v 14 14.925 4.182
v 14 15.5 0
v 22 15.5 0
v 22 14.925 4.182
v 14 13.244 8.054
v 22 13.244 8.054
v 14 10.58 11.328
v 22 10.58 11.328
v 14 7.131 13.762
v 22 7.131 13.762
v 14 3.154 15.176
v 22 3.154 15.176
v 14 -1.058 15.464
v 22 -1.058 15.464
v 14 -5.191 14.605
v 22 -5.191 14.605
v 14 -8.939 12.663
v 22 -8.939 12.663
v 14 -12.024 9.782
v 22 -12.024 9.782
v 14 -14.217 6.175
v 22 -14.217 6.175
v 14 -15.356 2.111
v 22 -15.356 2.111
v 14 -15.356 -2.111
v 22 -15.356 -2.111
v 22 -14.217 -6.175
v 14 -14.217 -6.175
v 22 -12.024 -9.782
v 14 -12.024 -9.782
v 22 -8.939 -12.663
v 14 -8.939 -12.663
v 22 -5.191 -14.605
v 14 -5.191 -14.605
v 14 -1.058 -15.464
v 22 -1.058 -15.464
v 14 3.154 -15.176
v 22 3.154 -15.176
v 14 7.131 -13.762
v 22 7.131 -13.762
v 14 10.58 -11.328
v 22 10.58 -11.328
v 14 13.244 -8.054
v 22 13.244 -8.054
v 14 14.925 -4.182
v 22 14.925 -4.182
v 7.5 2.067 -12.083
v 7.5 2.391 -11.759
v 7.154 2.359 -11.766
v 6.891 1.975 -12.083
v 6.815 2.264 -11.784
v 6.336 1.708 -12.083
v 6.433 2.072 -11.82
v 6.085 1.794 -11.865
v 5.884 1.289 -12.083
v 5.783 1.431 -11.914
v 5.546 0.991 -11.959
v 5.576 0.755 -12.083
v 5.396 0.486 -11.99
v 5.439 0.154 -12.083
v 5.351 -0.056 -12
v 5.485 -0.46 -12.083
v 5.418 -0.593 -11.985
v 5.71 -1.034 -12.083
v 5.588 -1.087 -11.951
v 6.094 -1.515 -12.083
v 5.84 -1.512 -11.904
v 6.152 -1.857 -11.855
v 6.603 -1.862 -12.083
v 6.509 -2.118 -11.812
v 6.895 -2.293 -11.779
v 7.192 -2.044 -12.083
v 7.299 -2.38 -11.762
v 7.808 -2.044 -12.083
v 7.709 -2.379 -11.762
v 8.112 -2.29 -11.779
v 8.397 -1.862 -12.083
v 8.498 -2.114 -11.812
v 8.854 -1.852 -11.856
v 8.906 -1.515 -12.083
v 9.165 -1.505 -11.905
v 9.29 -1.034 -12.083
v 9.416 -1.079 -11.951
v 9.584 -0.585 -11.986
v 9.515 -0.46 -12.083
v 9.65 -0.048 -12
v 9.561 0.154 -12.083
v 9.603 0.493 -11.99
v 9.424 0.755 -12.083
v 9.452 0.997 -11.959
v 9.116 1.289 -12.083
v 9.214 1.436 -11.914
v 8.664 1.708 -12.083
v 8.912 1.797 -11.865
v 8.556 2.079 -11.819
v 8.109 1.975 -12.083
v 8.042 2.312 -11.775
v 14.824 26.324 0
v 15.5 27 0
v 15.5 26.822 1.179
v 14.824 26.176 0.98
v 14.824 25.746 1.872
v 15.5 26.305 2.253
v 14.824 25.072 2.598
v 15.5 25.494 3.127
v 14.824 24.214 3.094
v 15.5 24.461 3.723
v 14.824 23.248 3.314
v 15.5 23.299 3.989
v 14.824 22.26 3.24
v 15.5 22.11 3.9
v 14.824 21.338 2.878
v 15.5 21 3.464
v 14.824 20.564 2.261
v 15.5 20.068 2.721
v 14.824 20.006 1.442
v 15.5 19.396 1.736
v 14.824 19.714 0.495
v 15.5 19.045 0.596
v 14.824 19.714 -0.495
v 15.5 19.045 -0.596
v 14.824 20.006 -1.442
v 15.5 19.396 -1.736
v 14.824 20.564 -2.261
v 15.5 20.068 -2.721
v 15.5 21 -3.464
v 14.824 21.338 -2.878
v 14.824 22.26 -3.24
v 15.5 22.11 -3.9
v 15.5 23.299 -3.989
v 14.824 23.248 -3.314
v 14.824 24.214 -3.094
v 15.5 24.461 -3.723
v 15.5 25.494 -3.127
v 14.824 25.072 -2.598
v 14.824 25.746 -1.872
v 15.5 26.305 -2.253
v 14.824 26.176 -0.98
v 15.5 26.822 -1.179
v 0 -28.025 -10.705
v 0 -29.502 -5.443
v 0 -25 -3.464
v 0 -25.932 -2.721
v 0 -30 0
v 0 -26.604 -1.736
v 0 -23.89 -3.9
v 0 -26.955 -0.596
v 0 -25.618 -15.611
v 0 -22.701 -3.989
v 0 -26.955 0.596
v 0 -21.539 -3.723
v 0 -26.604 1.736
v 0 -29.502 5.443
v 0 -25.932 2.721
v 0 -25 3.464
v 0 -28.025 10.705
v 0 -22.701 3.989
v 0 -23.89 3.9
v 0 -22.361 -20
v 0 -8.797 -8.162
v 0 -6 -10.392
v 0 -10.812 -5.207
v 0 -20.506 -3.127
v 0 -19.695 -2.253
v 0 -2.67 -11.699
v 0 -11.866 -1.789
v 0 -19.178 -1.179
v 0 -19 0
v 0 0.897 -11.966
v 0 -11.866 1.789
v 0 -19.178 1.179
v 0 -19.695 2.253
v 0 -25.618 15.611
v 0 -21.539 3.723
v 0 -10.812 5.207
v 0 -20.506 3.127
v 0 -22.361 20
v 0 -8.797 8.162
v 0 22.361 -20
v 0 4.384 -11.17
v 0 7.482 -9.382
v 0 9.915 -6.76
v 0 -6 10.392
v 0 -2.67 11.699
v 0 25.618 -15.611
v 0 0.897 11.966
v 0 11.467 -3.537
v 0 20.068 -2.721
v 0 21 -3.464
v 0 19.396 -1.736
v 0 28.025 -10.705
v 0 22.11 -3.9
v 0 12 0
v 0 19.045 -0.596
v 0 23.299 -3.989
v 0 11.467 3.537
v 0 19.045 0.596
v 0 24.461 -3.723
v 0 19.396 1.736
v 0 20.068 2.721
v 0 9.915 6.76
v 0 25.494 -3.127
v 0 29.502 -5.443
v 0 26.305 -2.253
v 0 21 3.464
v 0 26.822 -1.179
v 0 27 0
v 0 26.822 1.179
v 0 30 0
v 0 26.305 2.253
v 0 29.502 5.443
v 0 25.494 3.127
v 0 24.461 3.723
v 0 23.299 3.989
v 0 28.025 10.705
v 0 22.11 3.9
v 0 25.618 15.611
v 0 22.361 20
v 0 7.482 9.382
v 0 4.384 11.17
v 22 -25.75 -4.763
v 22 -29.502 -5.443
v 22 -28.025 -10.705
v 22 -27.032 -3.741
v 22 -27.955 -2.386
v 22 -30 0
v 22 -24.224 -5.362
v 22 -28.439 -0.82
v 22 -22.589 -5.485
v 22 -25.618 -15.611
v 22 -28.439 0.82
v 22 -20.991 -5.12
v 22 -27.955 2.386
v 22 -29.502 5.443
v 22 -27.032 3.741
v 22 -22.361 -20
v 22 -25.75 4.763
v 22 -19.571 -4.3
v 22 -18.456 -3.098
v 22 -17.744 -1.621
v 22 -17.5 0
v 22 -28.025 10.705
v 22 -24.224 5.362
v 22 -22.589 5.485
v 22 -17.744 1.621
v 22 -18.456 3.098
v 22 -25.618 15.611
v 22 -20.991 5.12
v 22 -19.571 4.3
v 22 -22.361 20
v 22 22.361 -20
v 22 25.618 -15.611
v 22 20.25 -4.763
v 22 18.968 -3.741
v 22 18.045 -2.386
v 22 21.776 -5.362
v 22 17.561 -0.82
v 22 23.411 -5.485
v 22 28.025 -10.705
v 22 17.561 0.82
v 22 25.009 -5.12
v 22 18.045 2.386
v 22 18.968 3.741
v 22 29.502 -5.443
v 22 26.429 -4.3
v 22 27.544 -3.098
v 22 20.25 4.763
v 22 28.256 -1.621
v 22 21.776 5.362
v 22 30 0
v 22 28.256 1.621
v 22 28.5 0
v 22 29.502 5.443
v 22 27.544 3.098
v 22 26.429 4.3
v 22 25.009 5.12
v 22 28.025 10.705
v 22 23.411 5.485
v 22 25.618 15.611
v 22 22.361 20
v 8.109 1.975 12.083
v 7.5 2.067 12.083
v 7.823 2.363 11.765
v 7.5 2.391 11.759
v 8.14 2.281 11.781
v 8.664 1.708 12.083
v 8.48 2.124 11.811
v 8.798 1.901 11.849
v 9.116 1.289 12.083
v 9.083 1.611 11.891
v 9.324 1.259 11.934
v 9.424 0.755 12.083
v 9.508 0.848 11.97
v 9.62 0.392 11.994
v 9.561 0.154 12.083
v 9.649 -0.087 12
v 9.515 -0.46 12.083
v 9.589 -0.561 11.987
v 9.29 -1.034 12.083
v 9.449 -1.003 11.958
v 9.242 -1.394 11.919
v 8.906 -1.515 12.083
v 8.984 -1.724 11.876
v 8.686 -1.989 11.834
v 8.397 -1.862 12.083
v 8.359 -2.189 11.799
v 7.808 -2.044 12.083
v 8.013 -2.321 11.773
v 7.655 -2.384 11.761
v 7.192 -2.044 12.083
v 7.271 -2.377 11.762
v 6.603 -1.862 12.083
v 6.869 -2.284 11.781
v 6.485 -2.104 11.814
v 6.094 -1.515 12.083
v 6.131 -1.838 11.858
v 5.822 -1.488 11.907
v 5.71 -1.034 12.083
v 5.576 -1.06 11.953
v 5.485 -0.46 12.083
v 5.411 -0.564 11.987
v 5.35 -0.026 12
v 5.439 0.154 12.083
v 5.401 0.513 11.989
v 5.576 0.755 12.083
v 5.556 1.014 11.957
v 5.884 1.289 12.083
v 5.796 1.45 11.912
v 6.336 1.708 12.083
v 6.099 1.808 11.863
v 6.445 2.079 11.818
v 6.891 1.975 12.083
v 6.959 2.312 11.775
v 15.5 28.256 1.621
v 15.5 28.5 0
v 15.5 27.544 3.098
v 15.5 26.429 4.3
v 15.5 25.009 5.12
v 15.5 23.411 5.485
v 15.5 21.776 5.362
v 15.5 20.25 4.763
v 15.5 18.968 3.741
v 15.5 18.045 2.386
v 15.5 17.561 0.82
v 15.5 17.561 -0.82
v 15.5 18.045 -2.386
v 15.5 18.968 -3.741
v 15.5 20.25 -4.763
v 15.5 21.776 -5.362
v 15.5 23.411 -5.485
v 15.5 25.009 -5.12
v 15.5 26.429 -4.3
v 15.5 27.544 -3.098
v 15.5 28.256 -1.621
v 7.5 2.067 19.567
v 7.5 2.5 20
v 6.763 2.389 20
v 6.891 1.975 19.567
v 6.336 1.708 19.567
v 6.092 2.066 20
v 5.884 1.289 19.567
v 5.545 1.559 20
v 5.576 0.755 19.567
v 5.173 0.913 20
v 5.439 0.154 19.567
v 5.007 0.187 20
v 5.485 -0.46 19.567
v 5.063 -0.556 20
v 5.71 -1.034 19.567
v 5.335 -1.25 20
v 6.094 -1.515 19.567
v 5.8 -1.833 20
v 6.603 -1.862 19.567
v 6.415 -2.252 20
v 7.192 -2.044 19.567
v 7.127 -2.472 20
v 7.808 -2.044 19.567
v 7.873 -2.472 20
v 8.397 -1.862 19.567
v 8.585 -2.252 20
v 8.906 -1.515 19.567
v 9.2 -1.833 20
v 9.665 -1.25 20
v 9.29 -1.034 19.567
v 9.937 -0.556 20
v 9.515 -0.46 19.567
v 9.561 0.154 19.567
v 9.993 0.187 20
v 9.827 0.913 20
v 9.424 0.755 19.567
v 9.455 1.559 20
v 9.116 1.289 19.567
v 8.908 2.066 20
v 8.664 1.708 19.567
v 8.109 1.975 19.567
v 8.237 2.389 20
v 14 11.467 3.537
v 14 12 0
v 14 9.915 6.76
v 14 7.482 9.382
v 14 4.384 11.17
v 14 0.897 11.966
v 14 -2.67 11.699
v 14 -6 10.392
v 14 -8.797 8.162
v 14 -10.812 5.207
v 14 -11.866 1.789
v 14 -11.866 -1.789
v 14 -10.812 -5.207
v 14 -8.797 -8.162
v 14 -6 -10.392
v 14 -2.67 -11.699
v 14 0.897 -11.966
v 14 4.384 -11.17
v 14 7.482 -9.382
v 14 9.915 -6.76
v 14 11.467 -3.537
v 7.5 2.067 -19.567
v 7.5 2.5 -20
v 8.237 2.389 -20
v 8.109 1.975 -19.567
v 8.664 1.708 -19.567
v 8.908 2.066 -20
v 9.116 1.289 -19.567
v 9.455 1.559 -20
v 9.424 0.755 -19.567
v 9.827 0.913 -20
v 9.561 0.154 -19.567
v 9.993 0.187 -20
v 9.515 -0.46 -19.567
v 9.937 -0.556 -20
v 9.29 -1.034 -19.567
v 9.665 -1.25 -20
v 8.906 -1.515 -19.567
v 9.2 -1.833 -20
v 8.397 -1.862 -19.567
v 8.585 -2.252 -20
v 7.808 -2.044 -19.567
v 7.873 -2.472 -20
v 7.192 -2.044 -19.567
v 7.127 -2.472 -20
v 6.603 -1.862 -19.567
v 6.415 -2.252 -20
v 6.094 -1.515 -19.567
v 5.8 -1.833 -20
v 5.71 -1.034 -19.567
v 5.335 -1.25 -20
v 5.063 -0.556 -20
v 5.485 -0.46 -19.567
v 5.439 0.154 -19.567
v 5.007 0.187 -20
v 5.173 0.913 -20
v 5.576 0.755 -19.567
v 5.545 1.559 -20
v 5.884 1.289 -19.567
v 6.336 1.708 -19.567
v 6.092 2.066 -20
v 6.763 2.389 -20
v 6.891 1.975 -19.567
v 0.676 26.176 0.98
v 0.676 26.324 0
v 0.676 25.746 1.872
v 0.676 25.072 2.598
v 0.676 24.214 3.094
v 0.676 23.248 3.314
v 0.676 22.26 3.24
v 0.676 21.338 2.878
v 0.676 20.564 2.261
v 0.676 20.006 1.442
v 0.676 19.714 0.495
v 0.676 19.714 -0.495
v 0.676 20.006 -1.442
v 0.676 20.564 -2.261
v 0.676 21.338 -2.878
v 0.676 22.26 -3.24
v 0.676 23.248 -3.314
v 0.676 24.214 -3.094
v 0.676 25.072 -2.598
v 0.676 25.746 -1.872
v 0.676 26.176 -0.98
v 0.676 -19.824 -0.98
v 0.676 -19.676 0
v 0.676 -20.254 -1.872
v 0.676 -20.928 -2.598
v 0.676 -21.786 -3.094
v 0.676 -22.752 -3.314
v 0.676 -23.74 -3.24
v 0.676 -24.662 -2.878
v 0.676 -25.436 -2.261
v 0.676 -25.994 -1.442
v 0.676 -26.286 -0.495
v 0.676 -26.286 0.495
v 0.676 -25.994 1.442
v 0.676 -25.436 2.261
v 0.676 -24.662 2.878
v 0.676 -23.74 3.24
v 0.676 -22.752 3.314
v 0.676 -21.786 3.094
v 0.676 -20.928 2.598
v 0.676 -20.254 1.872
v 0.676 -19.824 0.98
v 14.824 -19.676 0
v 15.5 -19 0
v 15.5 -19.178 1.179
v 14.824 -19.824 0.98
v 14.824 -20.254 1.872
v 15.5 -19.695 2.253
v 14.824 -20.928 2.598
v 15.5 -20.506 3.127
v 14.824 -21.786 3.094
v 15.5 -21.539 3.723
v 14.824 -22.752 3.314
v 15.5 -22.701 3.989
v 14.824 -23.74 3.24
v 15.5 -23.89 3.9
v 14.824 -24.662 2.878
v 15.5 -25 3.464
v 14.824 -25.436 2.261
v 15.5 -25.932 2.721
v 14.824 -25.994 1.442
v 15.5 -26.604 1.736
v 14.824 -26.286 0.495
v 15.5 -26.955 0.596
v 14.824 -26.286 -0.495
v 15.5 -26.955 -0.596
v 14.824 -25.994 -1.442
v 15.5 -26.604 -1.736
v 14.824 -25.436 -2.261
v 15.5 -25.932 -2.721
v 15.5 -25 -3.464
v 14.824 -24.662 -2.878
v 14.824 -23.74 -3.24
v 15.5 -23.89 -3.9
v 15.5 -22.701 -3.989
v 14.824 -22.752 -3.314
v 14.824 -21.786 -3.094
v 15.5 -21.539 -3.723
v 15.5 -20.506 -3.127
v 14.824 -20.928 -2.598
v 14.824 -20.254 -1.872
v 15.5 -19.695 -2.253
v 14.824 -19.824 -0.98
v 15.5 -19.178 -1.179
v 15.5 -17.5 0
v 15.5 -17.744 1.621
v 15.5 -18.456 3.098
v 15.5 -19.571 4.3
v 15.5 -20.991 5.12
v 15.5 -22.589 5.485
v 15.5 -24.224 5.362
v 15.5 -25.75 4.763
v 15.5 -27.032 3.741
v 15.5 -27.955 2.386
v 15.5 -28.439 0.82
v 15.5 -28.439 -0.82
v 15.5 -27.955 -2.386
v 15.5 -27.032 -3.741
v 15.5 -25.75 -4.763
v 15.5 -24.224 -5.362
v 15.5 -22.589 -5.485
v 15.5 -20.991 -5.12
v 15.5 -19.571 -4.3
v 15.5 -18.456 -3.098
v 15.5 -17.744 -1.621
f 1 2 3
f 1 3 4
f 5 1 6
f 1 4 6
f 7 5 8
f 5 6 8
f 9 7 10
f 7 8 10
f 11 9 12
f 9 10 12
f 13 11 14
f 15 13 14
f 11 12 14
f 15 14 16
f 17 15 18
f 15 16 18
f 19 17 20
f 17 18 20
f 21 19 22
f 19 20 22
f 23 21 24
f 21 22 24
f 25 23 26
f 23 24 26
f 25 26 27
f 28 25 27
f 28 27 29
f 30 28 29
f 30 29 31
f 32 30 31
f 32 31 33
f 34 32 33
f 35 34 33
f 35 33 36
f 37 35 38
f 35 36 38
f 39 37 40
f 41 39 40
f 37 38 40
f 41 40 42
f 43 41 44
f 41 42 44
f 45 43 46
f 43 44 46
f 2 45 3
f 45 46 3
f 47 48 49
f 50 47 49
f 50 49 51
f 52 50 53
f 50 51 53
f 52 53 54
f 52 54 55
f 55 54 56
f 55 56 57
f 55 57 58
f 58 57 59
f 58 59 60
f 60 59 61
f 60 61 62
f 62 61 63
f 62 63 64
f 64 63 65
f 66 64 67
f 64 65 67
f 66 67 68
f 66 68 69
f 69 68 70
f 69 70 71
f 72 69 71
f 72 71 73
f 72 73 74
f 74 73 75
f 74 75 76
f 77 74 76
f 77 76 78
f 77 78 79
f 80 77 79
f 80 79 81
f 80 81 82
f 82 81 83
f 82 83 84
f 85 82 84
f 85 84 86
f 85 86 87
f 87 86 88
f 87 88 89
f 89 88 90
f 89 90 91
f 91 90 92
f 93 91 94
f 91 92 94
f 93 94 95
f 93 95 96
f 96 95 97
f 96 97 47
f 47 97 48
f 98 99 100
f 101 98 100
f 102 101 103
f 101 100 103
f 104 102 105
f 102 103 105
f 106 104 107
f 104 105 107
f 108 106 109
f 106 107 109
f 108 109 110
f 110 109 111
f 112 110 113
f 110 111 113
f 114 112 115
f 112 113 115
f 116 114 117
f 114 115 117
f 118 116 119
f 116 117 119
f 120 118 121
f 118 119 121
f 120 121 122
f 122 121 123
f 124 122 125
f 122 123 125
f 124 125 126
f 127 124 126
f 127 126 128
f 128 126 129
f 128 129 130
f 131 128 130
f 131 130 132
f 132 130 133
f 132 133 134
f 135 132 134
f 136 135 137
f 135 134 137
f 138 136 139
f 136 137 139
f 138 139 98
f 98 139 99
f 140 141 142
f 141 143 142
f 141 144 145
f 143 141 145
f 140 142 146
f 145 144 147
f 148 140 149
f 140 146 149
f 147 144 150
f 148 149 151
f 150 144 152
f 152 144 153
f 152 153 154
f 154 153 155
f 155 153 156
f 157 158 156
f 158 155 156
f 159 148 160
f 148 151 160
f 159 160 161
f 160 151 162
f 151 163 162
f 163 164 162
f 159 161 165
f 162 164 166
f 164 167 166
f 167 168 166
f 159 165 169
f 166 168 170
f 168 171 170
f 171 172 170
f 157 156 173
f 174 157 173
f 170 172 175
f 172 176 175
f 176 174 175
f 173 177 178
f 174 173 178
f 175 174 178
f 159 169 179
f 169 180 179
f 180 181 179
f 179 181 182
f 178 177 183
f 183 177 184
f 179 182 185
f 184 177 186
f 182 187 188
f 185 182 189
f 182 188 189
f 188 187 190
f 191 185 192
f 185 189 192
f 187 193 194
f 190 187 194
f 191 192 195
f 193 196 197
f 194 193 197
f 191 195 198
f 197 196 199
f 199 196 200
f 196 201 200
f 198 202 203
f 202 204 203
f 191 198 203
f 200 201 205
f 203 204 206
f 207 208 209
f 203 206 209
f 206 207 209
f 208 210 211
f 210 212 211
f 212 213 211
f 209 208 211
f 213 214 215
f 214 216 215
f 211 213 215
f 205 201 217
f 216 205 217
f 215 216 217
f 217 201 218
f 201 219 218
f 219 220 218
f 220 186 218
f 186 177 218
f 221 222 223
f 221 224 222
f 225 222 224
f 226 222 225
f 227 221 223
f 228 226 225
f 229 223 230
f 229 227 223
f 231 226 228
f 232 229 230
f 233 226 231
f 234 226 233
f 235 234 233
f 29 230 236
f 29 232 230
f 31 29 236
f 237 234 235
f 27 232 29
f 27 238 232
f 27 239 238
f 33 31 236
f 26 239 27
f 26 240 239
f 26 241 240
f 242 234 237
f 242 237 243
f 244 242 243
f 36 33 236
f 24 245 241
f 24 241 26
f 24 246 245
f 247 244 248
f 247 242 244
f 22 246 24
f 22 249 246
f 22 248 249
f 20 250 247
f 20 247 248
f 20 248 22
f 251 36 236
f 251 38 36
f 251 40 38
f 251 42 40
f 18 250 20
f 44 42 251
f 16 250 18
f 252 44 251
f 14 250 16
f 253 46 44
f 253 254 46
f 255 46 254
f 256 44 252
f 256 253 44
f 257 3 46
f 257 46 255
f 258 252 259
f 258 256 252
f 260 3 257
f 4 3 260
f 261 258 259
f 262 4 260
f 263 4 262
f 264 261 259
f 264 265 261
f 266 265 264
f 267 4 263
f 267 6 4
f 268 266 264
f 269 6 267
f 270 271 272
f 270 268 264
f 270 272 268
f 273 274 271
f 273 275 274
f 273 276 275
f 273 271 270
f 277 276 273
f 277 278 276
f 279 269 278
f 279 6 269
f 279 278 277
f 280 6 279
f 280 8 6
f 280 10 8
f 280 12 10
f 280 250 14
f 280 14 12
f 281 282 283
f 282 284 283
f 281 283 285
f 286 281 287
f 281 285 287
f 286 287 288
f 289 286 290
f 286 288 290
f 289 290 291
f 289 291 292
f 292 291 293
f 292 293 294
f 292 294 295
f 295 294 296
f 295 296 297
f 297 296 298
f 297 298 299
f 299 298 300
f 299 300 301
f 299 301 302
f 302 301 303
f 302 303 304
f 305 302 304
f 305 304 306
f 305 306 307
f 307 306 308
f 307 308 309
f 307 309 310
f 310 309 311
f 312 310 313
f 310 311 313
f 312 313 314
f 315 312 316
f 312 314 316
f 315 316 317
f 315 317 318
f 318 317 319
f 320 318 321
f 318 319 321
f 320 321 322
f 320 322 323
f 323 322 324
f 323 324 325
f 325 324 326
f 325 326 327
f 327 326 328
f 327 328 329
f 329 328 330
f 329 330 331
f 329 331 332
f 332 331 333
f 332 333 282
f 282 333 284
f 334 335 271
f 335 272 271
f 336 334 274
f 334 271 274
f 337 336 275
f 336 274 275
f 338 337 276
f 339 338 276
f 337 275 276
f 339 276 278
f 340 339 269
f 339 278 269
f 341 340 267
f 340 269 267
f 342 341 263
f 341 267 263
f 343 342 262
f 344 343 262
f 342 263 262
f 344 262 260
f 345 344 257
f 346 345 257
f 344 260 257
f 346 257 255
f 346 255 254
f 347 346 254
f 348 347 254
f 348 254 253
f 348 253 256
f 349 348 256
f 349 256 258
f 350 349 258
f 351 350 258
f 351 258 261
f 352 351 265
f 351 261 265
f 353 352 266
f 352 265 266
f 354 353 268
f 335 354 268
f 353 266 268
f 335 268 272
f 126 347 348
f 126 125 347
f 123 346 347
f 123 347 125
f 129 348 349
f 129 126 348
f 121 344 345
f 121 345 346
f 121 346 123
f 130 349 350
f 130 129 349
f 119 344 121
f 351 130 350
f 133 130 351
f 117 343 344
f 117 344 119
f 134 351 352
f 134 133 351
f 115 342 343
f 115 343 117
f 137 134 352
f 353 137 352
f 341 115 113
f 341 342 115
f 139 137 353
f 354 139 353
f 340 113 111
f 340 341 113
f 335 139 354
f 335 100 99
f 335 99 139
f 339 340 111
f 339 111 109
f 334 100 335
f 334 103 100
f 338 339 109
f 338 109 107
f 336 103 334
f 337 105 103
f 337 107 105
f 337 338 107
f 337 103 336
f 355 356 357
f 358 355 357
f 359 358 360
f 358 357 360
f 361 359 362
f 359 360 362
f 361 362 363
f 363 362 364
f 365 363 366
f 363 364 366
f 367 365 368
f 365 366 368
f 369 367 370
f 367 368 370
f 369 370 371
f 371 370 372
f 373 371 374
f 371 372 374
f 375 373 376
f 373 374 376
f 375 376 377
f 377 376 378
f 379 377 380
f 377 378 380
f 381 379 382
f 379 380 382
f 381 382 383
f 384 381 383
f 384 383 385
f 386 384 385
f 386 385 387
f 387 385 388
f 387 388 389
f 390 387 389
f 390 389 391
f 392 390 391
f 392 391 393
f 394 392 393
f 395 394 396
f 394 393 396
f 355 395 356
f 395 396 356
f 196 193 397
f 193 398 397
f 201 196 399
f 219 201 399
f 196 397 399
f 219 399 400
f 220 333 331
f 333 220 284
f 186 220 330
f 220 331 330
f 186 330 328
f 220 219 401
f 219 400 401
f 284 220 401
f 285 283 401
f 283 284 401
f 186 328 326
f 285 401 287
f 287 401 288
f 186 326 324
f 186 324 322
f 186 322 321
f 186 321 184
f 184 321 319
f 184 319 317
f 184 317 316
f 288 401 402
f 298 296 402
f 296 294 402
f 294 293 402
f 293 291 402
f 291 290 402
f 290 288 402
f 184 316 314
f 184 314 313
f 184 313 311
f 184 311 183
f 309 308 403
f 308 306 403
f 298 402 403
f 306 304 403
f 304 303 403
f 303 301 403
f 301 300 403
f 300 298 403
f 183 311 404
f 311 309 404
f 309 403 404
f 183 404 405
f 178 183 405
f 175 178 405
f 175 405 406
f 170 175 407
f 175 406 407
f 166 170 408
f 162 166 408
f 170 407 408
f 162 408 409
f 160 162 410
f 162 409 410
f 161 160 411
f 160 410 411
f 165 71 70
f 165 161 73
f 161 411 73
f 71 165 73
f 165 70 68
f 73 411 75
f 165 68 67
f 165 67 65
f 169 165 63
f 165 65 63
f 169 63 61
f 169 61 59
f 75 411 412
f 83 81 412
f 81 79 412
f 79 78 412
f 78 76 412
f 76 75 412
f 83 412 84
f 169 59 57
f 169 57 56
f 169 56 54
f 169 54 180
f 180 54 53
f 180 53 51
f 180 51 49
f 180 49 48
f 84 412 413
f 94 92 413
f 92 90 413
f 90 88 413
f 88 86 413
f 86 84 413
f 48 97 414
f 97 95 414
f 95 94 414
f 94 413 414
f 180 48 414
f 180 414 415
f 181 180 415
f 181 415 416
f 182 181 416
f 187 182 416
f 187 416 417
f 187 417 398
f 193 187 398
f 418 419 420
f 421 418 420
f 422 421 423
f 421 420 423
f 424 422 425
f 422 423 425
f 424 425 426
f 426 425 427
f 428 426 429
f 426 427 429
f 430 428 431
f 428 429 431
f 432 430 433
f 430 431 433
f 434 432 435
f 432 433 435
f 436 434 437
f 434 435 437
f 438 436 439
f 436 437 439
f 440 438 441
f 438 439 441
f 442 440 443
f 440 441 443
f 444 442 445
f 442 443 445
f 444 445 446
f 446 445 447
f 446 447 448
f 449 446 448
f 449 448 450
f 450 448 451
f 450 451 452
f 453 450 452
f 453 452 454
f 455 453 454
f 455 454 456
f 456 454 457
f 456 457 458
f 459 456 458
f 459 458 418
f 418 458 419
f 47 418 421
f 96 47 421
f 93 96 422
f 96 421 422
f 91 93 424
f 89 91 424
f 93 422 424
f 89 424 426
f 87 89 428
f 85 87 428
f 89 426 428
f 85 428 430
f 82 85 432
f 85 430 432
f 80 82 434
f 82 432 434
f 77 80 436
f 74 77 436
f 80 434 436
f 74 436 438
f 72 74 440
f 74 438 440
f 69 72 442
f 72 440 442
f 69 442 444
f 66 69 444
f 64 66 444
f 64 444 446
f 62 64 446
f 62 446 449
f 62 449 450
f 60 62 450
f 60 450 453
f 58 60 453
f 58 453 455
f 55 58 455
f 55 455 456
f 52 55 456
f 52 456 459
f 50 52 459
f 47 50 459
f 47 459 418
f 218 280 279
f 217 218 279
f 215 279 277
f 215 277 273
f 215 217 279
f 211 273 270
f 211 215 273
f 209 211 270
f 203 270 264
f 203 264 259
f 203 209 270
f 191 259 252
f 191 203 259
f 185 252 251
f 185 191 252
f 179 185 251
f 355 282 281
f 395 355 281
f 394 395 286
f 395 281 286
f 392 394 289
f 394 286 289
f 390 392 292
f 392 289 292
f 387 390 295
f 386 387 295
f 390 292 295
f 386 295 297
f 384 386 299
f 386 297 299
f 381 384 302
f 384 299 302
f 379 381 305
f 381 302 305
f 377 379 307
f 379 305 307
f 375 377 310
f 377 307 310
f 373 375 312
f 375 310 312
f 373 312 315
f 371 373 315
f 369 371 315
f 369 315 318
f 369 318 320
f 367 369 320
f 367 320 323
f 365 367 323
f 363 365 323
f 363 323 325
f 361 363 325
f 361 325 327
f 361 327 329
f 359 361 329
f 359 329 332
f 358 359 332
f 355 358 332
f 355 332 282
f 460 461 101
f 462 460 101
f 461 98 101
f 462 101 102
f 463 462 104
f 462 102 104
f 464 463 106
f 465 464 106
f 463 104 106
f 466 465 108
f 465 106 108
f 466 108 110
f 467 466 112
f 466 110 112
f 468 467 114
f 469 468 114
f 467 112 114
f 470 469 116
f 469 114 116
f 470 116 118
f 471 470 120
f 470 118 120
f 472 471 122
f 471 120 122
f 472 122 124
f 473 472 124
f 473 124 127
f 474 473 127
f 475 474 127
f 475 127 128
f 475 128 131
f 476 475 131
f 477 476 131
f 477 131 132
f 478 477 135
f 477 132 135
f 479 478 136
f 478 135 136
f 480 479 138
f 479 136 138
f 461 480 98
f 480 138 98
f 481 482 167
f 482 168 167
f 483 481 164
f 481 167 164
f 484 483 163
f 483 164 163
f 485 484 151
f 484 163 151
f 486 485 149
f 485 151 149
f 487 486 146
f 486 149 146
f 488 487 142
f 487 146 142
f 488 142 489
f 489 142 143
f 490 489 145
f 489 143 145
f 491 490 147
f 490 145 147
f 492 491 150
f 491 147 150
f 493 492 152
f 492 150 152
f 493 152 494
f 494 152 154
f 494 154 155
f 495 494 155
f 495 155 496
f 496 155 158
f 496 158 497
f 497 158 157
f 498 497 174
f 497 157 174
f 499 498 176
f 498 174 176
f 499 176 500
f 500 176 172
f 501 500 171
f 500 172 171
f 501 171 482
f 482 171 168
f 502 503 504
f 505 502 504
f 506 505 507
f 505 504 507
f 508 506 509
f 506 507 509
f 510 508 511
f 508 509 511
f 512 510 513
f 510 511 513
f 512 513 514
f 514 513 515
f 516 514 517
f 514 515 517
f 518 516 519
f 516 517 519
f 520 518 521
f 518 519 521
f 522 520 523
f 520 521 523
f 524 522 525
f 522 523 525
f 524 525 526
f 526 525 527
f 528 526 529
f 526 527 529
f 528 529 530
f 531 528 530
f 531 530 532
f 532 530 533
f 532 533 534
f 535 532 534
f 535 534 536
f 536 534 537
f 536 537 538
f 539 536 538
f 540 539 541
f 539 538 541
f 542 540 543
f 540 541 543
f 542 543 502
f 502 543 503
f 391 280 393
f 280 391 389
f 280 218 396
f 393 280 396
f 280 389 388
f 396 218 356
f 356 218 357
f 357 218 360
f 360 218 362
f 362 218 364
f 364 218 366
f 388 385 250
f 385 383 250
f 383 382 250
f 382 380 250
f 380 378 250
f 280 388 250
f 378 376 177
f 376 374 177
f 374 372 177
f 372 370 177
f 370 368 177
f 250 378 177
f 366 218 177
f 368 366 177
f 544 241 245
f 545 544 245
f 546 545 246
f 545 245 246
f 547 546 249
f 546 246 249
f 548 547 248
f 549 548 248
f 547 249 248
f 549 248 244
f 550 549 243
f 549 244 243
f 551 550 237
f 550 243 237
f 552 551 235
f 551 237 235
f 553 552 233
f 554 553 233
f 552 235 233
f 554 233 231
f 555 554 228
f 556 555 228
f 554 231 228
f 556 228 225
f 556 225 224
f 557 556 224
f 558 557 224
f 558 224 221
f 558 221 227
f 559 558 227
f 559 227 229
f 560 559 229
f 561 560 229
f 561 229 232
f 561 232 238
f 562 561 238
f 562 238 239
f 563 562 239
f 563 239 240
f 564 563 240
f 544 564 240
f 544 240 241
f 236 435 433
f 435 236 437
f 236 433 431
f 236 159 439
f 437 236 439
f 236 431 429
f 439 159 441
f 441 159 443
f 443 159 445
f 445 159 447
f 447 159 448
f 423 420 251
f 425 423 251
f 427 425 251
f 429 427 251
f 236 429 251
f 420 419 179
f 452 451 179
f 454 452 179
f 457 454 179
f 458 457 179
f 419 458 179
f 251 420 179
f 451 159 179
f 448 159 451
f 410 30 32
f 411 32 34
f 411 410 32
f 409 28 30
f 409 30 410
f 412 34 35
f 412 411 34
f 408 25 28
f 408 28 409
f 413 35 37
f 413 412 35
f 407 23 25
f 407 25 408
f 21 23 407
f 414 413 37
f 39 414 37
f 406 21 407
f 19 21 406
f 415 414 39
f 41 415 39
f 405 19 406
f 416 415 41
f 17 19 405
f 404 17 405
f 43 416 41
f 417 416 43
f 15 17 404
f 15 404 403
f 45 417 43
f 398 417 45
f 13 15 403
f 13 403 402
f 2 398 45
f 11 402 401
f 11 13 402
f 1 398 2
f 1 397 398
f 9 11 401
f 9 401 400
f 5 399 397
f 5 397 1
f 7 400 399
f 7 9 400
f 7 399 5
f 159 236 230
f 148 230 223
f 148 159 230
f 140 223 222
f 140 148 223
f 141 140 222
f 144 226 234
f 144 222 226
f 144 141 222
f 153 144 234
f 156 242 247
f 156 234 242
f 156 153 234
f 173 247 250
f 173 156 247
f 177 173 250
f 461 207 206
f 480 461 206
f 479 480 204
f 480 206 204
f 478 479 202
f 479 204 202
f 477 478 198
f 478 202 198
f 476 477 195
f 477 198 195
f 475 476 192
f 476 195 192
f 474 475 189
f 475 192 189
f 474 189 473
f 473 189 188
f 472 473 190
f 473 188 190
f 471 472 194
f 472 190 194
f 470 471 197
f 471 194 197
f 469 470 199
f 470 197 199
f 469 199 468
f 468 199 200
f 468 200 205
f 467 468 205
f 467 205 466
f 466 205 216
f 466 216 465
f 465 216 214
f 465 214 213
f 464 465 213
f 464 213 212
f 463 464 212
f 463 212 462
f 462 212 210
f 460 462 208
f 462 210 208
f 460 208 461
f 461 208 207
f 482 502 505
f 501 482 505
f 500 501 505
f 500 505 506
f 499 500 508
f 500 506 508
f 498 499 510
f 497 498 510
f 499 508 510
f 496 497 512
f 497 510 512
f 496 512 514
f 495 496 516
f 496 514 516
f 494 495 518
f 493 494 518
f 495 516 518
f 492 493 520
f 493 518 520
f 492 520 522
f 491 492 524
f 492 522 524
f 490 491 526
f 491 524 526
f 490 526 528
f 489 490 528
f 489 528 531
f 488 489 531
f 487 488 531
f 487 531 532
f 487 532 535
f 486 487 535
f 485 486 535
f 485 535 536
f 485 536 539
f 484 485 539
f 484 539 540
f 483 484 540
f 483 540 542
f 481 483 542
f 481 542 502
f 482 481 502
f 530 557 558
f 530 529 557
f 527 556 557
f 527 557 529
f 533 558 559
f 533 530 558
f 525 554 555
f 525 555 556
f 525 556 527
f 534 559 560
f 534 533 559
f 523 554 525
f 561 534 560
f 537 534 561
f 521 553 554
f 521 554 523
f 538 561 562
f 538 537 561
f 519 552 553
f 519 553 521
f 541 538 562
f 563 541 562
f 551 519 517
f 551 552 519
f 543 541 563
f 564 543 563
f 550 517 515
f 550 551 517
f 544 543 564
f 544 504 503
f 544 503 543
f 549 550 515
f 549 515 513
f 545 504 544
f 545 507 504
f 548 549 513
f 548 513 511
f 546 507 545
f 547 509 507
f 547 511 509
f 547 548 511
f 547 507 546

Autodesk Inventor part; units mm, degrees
sketch "Sketch_1" plane through (0, 0, 0) normal (0, 0, 1) x (1, 0, 0)
  line L0 (22, 0) -> (0, 0)
  line L1 (0, 30) -> (0, 12)
  line L2 (0, 12) -> (14, 12)
  line L3 (14, 12) -> (14, 15.5)
  line L4 (14, 15.5) -> (22, 15.5)
  line L5 (22, 15.5) -> (22, 30)
  line L6 (22, 30) -> (0, 30)
revolve "Revolution1" add sketch "Sketch_1" angle 360 about axis through (22, 0, 0) along (1, 0, 0)
sketch "Sketch_2" plane through (0, 0, 0) normal (1, 0, 0) x (0, 1, 0)
  line L0 (-120, 80) -> (-120, -80)
  line L1 (-120, -80) -> (120, -80)
  line L2 (120, -80) -> (120, 80)
  line L3 (120, 80) -> (-120, 80)
  line L4 (-30, 20) -> (-30, -20)
  line L5 (-30, -20) -> (30, -20)
  line L6 (30, -20) -> (30, 20)
  line L7 (30, 20) -> (-30, 20)
extrude "Extrusion1" cut sketch "Sketch_2" along normal blind 24
sketch "Sketch_3" plane through (0, 0, 0) normal (0, 0, 1) x (1, 0, 0)
  line L0 (22, 23) -> (0, 23)
  line L1 (0, 23) -> (0, 27)
  line L2 (0, 27) -> (0.6765, 26.3235)
  line L3 (0.6765, 26.3235) -> (14.8235, 26.3235)
  line L4 (14.8235, 26.3235) -> (15.5, 27)
  line L5 (15.5, 27) -> (15.5, 28.5)
  line L6 (15.5, 28.5) -> (22, 28.5)
  line L7 (22, 28.5) -> (22, 23)
  line L8 (22, 23) -> (0, 23)
revolve "Revolution2" cut sketch "Sketch_3" angle 360 about axis through (22, 23, 0) along (1, 0, 0)
thread "Thread1" size "M8x1.25" class "6H" standard "ISO Metric profile" full length
pattern_linear "Rectangular Pattern1" count 2 spacing 46 along (0, -1, 0) of "Revolution2"
sketch "Sketch_4" plane through (7.5, 0, 0) normal (1, 0, 0) x (0, 0, -1)
  line L0 (-11.65, 0) -> (-20, 0)
  line L1 (-20, 0) -> (-20, 2.5)
  line L2 (-20, 2.5) -> (-19.567, 2.067)
  line L3 (-19.567, 2.067) -> (-12.083, 2.067)
  line L4 (-12.083, 2.067) -> (-11.65, 2.5)
  line L5 (-11.65, 2.5) -> (-11.65, 0)
  line L6 (-11.65, 0) -> (-20, 0)
revolve "Revolution3" cut sketch "Sketch_4" angle 360 about axis through (7.5, 0, 11.65) along (0, 0, -1)
thread "Thread2" size "M5x0.8" class "6H" standard "ISO Metric profile" full length
sketch "Sketch_6" plane through (7.5, 0, 0) normal (1, 0, 0) x (0, 0, -1)
  line L0 (20, 0) -> (11.65, 0)
  line L1 (11.65, 0) -> (11.65, 2.5)
  line L2 (11.65, 2.5) -> (12.083, 2.067)
  line L3 (12.083, 2.067) -> (19.567, 2.067)
  line L4 (19.567, 2.067) -> (20, 2.5)
  line L5 (20, 2.5) -> (20, 0)
  line L6 (20, 0) -> (11.65, 0)
revolve "Revolution4" cut sketch "Sketch_6" angle 360 about axis through (7.5, 0, -20) along (0, 0, -1)
thread "Thread3" size "M5x0.8" class "6H" standard "ISO Metric profile" full length
ref_plane "to_bearings_XY" through (14, 0, 0) normal (1, 0, 0) x (0, 0, -1)
ref_plane "to_bearings_YZ" through (14, 0, 0) normal (0, 0, -1) x (0, 1, 0)
ref_plane "to_bearings_ZX" through (14, 0, 0) normal (0, 1, 0) x (1, 0, 0)
ref_plane "to_screw1_XY" through (7.5, 0, 12) normal (0, 0, 1) x (1, 0, 0)
ref_plane "to_screw1_YZ" through (7.5, 0, 12) normal (1, 0, 0) x (0, 1, 0)
ref_plane "to_screw1_ZX" through (7.5, 0, 12) normal (0, 1, 0) x (0, 0, 1)
ref_plane "to_screw2_XY" through (7.5, 0, -12) normal (0, 0, -1) x (1, 0, 0)
ref_plane "to_screw2_YZ" through (7.5, 0, -12) normal (1, 0, 0) x (0, -1, 0)
ref_plane "to_screw2_ZX" through (7.5, 0, -12) normal (0, -1, 0) x (0, 0, -1)
properties part number "BGCSB12_h"
